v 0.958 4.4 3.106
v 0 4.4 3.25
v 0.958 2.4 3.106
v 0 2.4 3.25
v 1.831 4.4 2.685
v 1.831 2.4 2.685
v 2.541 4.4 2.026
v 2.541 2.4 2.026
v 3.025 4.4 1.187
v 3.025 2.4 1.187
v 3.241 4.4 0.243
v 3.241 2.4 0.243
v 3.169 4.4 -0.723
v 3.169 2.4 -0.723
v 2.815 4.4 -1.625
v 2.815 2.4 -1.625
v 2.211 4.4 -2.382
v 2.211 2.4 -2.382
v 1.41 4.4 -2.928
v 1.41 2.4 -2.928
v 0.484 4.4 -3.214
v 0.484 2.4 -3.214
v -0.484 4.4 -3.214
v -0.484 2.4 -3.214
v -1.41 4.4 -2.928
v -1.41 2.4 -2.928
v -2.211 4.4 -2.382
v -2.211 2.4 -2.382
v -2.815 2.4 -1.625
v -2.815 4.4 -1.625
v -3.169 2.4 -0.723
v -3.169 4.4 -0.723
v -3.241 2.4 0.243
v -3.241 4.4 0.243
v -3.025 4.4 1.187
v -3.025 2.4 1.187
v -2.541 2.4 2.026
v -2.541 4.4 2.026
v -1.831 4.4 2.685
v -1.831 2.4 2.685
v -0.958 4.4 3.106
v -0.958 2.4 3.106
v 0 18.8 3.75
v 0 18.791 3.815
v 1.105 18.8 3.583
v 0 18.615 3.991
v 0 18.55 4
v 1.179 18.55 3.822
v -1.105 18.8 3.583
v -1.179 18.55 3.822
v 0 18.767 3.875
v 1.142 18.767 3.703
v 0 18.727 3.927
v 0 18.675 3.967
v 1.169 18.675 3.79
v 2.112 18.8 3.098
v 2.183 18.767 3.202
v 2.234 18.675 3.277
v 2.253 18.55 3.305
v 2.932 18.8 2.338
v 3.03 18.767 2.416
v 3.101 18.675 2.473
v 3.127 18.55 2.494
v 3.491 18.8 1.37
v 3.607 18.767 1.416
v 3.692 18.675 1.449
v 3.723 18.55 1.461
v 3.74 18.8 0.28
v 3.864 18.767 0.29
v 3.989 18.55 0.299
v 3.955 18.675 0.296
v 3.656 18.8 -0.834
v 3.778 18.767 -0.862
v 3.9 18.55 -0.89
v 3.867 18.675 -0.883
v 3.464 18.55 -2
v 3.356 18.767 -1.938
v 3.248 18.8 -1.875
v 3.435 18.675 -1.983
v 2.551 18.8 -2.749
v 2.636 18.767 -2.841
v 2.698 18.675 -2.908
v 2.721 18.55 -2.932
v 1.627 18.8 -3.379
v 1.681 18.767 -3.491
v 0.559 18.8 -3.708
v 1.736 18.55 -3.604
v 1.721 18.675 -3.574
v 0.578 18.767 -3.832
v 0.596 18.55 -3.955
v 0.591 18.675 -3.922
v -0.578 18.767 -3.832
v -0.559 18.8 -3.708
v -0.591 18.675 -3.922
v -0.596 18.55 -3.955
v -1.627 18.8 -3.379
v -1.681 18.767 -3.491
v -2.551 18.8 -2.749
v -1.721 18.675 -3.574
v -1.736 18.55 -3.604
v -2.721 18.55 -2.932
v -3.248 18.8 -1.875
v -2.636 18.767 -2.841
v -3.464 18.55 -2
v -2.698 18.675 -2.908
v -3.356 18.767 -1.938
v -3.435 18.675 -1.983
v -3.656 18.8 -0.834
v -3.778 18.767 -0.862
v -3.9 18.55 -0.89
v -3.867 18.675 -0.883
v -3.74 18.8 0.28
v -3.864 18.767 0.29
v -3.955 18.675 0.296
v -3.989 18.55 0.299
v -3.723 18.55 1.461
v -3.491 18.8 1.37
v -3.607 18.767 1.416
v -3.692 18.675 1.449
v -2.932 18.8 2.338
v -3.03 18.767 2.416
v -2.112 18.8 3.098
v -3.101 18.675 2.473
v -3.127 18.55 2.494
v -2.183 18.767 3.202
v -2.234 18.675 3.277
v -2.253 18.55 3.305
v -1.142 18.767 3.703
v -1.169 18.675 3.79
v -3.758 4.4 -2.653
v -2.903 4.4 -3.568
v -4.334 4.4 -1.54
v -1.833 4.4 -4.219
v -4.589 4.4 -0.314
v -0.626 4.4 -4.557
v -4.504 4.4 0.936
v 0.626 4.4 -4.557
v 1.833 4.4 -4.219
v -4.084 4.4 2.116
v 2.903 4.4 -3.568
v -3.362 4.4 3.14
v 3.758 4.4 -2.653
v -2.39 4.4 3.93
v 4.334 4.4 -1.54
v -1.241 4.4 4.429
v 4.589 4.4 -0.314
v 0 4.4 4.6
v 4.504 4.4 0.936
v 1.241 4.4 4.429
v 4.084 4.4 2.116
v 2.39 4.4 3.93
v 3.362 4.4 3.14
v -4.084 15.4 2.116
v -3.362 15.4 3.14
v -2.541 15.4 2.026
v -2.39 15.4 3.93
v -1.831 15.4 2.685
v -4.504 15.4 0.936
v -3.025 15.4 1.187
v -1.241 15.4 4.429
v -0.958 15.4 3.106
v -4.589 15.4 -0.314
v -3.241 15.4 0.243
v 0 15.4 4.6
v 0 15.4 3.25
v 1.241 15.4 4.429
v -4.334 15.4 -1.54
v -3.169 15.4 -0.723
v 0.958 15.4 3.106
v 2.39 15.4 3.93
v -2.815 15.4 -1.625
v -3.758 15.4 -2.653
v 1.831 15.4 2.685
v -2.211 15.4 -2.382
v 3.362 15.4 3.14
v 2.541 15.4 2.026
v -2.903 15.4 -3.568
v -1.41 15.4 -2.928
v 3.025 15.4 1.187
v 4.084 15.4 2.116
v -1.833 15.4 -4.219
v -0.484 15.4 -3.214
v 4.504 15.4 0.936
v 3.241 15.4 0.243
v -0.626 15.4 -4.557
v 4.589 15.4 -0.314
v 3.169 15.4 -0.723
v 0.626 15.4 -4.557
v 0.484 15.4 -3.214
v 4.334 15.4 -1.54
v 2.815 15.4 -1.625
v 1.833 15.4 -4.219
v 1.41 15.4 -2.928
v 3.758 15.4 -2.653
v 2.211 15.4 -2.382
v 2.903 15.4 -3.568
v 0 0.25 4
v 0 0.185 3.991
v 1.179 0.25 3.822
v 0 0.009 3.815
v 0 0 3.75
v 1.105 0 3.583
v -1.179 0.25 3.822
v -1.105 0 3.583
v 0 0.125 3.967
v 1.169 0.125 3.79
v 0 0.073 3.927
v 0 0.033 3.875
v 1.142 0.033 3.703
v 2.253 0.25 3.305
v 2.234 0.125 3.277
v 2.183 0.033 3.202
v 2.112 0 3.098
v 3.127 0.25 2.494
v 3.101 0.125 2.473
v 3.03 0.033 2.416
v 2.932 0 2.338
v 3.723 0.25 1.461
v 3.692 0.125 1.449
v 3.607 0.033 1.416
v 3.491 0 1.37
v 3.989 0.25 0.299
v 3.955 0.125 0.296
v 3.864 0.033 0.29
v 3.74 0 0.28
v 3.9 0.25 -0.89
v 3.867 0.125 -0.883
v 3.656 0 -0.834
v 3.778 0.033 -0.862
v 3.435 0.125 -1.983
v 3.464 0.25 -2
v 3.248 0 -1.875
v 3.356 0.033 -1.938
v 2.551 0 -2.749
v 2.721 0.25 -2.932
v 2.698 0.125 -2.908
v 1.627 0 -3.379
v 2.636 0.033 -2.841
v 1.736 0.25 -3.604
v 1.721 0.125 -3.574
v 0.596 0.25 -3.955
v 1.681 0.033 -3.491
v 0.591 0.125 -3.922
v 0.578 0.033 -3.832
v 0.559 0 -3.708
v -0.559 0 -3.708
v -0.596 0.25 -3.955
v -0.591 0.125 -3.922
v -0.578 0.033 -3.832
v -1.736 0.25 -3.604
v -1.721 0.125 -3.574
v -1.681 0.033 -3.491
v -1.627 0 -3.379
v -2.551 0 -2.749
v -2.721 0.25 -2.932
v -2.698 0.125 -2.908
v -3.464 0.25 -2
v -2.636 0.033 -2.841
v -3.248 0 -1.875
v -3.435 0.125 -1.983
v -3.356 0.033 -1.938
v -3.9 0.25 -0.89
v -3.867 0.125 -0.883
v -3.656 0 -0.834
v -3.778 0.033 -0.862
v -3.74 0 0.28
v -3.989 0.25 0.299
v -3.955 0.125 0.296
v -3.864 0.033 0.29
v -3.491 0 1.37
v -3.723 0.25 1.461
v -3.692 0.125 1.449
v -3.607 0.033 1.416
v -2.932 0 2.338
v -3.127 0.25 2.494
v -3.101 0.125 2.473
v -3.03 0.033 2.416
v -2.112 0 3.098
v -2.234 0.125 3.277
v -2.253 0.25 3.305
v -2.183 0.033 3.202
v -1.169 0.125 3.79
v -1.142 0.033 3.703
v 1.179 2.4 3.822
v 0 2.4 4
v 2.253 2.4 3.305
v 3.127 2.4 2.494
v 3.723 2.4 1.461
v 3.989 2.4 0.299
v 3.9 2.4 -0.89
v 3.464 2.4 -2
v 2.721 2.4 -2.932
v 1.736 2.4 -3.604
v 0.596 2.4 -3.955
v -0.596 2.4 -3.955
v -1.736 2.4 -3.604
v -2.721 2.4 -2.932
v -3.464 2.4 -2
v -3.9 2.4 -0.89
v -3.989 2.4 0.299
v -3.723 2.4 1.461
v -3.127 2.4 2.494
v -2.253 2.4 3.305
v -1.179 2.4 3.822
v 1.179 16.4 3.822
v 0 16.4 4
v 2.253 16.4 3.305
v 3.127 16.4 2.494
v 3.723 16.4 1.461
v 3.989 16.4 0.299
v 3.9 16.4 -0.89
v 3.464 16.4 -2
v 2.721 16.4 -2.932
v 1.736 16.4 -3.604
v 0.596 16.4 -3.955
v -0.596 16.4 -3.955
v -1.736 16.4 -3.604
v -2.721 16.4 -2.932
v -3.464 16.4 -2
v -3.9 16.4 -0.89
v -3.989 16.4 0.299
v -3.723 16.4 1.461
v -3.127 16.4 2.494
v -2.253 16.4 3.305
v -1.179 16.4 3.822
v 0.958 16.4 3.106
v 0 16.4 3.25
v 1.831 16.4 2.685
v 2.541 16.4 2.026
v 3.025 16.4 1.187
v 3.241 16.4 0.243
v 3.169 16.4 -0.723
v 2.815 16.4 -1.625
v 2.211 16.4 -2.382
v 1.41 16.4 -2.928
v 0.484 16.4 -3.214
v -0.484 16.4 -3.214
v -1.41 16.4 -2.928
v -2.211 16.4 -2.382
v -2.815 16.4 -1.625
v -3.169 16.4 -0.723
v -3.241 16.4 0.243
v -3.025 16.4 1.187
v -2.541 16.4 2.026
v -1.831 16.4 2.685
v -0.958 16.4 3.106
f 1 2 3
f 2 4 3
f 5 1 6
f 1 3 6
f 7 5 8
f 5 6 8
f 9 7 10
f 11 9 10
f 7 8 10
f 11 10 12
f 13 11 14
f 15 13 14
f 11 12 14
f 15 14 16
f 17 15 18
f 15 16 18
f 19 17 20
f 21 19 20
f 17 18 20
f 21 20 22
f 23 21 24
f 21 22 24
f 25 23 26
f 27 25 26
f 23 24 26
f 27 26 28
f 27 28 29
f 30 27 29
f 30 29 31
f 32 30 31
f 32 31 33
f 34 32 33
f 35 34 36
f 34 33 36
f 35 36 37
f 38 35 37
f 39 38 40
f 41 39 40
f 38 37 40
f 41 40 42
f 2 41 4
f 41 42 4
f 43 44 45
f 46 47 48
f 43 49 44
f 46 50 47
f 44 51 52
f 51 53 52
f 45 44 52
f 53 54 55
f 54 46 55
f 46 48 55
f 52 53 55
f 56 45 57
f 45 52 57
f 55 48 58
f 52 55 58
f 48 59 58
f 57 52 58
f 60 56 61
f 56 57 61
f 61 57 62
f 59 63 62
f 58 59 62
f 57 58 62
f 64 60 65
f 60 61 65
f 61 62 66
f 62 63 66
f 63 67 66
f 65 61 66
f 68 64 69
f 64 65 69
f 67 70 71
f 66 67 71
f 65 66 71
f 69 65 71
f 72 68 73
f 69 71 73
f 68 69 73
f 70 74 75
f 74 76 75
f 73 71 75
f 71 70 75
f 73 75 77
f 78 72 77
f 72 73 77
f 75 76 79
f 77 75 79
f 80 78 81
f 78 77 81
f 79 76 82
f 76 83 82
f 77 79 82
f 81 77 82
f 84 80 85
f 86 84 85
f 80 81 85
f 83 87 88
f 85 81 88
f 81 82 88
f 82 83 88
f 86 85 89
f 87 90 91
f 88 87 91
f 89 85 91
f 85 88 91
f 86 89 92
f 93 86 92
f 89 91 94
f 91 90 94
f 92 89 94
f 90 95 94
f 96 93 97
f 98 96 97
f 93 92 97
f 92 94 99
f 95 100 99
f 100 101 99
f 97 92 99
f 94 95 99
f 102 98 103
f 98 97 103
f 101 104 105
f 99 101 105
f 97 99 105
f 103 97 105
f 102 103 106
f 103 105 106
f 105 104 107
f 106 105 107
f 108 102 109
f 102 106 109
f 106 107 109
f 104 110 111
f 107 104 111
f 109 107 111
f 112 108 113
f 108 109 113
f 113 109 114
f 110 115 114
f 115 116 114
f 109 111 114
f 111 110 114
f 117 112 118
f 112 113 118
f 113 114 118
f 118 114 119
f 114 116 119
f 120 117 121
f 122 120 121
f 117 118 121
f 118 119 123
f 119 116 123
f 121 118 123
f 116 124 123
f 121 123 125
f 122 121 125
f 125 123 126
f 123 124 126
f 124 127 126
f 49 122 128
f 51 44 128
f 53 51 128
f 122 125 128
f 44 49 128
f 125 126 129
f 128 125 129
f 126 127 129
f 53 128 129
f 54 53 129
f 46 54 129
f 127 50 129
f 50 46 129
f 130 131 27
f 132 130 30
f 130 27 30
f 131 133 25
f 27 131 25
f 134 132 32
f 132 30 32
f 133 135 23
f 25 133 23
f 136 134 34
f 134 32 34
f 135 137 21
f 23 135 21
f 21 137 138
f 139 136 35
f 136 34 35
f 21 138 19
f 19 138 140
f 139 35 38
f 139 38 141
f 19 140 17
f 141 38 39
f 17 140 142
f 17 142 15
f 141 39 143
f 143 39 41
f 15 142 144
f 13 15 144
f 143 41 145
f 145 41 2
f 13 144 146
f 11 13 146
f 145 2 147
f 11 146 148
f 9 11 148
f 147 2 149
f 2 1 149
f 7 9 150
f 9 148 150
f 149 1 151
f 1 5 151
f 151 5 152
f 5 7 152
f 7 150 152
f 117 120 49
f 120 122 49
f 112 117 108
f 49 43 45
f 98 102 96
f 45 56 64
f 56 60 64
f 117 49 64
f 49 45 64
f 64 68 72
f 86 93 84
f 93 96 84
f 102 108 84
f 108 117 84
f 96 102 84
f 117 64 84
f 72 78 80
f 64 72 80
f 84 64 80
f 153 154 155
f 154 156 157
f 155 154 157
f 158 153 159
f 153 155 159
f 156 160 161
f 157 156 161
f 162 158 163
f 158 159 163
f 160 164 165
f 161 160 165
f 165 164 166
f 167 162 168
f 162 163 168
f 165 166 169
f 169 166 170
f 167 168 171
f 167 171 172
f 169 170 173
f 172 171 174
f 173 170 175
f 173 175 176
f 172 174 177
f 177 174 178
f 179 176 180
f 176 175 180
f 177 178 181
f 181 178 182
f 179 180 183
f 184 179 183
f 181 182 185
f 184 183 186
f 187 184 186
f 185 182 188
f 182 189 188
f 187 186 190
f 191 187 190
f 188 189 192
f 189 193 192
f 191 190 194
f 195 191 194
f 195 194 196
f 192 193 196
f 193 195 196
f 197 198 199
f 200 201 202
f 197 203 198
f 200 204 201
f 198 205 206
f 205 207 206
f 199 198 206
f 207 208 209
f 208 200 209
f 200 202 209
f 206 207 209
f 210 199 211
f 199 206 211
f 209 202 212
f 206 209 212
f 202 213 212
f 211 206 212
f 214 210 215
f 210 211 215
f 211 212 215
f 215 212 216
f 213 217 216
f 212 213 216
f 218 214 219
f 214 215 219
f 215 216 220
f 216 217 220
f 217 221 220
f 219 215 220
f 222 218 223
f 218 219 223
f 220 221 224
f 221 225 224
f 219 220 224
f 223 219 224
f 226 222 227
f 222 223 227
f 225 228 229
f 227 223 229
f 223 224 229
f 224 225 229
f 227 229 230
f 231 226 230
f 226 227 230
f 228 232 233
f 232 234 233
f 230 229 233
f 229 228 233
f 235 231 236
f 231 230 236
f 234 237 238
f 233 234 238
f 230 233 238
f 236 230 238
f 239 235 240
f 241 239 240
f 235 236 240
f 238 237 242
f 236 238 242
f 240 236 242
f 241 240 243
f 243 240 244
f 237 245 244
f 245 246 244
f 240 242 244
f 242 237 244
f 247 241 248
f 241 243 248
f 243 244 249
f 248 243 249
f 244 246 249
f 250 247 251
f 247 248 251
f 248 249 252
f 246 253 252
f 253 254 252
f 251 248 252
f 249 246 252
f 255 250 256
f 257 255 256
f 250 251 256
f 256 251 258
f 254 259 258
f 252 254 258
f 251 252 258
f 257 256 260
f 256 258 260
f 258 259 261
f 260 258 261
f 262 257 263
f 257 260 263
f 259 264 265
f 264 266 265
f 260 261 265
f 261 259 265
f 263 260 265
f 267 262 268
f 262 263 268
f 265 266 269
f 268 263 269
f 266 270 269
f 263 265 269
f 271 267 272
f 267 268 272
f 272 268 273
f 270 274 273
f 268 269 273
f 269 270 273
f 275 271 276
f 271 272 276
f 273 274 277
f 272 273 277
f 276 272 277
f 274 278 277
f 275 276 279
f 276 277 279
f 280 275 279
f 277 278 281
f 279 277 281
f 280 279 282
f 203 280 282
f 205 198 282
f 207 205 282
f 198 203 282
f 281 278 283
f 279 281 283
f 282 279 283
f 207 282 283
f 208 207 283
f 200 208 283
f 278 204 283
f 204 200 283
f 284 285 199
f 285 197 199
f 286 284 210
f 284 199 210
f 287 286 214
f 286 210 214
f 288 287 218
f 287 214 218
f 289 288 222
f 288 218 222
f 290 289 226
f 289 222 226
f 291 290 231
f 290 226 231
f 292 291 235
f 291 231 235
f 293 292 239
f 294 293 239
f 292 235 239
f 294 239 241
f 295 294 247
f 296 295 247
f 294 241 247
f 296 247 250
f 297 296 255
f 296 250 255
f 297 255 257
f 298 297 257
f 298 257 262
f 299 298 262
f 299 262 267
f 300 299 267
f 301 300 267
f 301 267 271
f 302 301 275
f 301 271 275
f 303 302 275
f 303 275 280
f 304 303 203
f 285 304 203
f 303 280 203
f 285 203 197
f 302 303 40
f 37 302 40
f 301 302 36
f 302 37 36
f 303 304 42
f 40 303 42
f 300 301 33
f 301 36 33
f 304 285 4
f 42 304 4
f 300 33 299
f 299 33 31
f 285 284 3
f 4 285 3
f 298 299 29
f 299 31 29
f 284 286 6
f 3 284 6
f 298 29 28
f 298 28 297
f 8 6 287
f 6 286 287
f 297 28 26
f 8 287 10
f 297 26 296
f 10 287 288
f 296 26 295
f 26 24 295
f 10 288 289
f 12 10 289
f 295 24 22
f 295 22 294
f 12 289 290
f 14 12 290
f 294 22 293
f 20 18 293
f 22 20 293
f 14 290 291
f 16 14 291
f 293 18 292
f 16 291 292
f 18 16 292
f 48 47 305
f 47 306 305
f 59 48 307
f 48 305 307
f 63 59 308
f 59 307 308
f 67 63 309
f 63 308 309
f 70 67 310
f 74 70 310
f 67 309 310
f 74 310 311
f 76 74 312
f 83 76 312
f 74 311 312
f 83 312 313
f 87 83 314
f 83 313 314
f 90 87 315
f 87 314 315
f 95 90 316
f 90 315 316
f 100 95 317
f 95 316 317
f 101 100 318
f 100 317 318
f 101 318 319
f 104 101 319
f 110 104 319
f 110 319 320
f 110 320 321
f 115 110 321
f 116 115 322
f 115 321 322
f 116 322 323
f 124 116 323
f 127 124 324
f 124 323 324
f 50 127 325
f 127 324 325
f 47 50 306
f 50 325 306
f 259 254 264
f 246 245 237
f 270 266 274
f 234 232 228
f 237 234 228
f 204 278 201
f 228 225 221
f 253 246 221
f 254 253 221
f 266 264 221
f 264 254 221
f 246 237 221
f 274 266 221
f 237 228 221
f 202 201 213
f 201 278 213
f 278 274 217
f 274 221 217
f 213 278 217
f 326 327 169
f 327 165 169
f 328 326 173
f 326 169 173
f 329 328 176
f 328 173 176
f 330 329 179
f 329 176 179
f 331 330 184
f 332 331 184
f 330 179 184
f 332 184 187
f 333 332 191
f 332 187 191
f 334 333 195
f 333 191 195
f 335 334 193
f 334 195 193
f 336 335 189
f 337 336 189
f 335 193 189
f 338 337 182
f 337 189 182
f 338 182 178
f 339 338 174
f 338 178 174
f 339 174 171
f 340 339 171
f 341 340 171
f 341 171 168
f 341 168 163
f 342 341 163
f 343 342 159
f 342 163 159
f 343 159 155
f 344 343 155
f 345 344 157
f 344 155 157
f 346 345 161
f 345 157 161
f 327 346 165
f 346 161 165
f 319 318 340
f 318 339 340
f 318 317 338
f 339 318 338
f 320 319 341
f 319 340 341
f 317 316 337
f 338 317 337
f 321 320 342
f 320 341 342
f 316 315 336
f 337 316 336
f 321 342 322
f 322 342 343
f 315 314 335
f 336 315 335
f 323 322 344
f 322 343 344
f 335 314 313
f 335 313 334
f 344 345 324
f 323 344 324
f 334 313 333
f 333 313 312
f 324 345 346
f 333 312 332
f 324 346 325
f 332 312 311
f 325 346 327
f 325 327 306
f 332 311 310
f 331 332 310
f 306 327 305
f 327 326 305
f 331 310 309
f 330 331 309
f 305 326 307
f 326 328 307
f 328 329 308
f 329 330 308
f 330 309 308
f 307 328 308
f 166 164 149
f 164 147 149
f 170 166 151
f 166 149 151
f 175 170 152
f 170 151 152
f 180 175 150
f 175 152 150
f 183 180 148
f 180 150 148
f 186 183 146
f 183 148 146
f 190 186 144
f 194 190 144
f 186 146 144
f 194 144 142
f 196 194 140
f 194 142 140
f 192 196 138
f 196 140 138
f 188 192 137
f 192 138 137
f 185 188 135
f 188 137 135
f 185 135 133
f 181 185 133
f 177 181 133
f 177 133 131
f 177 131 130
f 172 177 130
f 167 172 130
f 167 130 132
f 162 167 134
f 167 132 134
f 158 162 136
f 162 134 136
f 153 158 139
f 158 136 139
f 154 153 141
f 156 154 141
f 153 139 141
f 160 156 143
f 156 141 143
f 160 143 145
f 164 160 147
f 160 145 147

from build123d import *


with BuildPart() as f1:
    # F0 (on Right) → F1 (revolve)
    with BuildSketch(Plane.YZ):
        with BuildLine():
            Line((0, 3.75), (0, 0))
            Line((0, 0), (18.8, 0))
            Line((18.8, 0), (18.8, 3.75))
            ThreePointArc((18.8, 3.75), (18.726777, 3.926777), (18.55, 4))
            Line((18.55, 4), (16.4, 4))
            Line((16.4, 4), (16.4, 3.25))
            Line((16.4, 3.25), (15.4, 3.25))
            Line((15.4, 3.25), (15.4, 4.6))
            Line((15.4, 4.6), (4.4, 4.6))
            Line((4.4, 4.6), (4.4, 3.25))
            Line((4.4, 3.25), (2.4, 3.25))
            Line((2.4, 3.25), (2.4, 4))
            Line((2.4, 4), (0.25, 4))
            ThreePointArc((0.25, 4), (0.073223, 3.926777), (0, 3.75))
        make_face()
    revolve(axis=Axis((0, 9.4, 0), (0, 1, 0)))


solid = f1.part
